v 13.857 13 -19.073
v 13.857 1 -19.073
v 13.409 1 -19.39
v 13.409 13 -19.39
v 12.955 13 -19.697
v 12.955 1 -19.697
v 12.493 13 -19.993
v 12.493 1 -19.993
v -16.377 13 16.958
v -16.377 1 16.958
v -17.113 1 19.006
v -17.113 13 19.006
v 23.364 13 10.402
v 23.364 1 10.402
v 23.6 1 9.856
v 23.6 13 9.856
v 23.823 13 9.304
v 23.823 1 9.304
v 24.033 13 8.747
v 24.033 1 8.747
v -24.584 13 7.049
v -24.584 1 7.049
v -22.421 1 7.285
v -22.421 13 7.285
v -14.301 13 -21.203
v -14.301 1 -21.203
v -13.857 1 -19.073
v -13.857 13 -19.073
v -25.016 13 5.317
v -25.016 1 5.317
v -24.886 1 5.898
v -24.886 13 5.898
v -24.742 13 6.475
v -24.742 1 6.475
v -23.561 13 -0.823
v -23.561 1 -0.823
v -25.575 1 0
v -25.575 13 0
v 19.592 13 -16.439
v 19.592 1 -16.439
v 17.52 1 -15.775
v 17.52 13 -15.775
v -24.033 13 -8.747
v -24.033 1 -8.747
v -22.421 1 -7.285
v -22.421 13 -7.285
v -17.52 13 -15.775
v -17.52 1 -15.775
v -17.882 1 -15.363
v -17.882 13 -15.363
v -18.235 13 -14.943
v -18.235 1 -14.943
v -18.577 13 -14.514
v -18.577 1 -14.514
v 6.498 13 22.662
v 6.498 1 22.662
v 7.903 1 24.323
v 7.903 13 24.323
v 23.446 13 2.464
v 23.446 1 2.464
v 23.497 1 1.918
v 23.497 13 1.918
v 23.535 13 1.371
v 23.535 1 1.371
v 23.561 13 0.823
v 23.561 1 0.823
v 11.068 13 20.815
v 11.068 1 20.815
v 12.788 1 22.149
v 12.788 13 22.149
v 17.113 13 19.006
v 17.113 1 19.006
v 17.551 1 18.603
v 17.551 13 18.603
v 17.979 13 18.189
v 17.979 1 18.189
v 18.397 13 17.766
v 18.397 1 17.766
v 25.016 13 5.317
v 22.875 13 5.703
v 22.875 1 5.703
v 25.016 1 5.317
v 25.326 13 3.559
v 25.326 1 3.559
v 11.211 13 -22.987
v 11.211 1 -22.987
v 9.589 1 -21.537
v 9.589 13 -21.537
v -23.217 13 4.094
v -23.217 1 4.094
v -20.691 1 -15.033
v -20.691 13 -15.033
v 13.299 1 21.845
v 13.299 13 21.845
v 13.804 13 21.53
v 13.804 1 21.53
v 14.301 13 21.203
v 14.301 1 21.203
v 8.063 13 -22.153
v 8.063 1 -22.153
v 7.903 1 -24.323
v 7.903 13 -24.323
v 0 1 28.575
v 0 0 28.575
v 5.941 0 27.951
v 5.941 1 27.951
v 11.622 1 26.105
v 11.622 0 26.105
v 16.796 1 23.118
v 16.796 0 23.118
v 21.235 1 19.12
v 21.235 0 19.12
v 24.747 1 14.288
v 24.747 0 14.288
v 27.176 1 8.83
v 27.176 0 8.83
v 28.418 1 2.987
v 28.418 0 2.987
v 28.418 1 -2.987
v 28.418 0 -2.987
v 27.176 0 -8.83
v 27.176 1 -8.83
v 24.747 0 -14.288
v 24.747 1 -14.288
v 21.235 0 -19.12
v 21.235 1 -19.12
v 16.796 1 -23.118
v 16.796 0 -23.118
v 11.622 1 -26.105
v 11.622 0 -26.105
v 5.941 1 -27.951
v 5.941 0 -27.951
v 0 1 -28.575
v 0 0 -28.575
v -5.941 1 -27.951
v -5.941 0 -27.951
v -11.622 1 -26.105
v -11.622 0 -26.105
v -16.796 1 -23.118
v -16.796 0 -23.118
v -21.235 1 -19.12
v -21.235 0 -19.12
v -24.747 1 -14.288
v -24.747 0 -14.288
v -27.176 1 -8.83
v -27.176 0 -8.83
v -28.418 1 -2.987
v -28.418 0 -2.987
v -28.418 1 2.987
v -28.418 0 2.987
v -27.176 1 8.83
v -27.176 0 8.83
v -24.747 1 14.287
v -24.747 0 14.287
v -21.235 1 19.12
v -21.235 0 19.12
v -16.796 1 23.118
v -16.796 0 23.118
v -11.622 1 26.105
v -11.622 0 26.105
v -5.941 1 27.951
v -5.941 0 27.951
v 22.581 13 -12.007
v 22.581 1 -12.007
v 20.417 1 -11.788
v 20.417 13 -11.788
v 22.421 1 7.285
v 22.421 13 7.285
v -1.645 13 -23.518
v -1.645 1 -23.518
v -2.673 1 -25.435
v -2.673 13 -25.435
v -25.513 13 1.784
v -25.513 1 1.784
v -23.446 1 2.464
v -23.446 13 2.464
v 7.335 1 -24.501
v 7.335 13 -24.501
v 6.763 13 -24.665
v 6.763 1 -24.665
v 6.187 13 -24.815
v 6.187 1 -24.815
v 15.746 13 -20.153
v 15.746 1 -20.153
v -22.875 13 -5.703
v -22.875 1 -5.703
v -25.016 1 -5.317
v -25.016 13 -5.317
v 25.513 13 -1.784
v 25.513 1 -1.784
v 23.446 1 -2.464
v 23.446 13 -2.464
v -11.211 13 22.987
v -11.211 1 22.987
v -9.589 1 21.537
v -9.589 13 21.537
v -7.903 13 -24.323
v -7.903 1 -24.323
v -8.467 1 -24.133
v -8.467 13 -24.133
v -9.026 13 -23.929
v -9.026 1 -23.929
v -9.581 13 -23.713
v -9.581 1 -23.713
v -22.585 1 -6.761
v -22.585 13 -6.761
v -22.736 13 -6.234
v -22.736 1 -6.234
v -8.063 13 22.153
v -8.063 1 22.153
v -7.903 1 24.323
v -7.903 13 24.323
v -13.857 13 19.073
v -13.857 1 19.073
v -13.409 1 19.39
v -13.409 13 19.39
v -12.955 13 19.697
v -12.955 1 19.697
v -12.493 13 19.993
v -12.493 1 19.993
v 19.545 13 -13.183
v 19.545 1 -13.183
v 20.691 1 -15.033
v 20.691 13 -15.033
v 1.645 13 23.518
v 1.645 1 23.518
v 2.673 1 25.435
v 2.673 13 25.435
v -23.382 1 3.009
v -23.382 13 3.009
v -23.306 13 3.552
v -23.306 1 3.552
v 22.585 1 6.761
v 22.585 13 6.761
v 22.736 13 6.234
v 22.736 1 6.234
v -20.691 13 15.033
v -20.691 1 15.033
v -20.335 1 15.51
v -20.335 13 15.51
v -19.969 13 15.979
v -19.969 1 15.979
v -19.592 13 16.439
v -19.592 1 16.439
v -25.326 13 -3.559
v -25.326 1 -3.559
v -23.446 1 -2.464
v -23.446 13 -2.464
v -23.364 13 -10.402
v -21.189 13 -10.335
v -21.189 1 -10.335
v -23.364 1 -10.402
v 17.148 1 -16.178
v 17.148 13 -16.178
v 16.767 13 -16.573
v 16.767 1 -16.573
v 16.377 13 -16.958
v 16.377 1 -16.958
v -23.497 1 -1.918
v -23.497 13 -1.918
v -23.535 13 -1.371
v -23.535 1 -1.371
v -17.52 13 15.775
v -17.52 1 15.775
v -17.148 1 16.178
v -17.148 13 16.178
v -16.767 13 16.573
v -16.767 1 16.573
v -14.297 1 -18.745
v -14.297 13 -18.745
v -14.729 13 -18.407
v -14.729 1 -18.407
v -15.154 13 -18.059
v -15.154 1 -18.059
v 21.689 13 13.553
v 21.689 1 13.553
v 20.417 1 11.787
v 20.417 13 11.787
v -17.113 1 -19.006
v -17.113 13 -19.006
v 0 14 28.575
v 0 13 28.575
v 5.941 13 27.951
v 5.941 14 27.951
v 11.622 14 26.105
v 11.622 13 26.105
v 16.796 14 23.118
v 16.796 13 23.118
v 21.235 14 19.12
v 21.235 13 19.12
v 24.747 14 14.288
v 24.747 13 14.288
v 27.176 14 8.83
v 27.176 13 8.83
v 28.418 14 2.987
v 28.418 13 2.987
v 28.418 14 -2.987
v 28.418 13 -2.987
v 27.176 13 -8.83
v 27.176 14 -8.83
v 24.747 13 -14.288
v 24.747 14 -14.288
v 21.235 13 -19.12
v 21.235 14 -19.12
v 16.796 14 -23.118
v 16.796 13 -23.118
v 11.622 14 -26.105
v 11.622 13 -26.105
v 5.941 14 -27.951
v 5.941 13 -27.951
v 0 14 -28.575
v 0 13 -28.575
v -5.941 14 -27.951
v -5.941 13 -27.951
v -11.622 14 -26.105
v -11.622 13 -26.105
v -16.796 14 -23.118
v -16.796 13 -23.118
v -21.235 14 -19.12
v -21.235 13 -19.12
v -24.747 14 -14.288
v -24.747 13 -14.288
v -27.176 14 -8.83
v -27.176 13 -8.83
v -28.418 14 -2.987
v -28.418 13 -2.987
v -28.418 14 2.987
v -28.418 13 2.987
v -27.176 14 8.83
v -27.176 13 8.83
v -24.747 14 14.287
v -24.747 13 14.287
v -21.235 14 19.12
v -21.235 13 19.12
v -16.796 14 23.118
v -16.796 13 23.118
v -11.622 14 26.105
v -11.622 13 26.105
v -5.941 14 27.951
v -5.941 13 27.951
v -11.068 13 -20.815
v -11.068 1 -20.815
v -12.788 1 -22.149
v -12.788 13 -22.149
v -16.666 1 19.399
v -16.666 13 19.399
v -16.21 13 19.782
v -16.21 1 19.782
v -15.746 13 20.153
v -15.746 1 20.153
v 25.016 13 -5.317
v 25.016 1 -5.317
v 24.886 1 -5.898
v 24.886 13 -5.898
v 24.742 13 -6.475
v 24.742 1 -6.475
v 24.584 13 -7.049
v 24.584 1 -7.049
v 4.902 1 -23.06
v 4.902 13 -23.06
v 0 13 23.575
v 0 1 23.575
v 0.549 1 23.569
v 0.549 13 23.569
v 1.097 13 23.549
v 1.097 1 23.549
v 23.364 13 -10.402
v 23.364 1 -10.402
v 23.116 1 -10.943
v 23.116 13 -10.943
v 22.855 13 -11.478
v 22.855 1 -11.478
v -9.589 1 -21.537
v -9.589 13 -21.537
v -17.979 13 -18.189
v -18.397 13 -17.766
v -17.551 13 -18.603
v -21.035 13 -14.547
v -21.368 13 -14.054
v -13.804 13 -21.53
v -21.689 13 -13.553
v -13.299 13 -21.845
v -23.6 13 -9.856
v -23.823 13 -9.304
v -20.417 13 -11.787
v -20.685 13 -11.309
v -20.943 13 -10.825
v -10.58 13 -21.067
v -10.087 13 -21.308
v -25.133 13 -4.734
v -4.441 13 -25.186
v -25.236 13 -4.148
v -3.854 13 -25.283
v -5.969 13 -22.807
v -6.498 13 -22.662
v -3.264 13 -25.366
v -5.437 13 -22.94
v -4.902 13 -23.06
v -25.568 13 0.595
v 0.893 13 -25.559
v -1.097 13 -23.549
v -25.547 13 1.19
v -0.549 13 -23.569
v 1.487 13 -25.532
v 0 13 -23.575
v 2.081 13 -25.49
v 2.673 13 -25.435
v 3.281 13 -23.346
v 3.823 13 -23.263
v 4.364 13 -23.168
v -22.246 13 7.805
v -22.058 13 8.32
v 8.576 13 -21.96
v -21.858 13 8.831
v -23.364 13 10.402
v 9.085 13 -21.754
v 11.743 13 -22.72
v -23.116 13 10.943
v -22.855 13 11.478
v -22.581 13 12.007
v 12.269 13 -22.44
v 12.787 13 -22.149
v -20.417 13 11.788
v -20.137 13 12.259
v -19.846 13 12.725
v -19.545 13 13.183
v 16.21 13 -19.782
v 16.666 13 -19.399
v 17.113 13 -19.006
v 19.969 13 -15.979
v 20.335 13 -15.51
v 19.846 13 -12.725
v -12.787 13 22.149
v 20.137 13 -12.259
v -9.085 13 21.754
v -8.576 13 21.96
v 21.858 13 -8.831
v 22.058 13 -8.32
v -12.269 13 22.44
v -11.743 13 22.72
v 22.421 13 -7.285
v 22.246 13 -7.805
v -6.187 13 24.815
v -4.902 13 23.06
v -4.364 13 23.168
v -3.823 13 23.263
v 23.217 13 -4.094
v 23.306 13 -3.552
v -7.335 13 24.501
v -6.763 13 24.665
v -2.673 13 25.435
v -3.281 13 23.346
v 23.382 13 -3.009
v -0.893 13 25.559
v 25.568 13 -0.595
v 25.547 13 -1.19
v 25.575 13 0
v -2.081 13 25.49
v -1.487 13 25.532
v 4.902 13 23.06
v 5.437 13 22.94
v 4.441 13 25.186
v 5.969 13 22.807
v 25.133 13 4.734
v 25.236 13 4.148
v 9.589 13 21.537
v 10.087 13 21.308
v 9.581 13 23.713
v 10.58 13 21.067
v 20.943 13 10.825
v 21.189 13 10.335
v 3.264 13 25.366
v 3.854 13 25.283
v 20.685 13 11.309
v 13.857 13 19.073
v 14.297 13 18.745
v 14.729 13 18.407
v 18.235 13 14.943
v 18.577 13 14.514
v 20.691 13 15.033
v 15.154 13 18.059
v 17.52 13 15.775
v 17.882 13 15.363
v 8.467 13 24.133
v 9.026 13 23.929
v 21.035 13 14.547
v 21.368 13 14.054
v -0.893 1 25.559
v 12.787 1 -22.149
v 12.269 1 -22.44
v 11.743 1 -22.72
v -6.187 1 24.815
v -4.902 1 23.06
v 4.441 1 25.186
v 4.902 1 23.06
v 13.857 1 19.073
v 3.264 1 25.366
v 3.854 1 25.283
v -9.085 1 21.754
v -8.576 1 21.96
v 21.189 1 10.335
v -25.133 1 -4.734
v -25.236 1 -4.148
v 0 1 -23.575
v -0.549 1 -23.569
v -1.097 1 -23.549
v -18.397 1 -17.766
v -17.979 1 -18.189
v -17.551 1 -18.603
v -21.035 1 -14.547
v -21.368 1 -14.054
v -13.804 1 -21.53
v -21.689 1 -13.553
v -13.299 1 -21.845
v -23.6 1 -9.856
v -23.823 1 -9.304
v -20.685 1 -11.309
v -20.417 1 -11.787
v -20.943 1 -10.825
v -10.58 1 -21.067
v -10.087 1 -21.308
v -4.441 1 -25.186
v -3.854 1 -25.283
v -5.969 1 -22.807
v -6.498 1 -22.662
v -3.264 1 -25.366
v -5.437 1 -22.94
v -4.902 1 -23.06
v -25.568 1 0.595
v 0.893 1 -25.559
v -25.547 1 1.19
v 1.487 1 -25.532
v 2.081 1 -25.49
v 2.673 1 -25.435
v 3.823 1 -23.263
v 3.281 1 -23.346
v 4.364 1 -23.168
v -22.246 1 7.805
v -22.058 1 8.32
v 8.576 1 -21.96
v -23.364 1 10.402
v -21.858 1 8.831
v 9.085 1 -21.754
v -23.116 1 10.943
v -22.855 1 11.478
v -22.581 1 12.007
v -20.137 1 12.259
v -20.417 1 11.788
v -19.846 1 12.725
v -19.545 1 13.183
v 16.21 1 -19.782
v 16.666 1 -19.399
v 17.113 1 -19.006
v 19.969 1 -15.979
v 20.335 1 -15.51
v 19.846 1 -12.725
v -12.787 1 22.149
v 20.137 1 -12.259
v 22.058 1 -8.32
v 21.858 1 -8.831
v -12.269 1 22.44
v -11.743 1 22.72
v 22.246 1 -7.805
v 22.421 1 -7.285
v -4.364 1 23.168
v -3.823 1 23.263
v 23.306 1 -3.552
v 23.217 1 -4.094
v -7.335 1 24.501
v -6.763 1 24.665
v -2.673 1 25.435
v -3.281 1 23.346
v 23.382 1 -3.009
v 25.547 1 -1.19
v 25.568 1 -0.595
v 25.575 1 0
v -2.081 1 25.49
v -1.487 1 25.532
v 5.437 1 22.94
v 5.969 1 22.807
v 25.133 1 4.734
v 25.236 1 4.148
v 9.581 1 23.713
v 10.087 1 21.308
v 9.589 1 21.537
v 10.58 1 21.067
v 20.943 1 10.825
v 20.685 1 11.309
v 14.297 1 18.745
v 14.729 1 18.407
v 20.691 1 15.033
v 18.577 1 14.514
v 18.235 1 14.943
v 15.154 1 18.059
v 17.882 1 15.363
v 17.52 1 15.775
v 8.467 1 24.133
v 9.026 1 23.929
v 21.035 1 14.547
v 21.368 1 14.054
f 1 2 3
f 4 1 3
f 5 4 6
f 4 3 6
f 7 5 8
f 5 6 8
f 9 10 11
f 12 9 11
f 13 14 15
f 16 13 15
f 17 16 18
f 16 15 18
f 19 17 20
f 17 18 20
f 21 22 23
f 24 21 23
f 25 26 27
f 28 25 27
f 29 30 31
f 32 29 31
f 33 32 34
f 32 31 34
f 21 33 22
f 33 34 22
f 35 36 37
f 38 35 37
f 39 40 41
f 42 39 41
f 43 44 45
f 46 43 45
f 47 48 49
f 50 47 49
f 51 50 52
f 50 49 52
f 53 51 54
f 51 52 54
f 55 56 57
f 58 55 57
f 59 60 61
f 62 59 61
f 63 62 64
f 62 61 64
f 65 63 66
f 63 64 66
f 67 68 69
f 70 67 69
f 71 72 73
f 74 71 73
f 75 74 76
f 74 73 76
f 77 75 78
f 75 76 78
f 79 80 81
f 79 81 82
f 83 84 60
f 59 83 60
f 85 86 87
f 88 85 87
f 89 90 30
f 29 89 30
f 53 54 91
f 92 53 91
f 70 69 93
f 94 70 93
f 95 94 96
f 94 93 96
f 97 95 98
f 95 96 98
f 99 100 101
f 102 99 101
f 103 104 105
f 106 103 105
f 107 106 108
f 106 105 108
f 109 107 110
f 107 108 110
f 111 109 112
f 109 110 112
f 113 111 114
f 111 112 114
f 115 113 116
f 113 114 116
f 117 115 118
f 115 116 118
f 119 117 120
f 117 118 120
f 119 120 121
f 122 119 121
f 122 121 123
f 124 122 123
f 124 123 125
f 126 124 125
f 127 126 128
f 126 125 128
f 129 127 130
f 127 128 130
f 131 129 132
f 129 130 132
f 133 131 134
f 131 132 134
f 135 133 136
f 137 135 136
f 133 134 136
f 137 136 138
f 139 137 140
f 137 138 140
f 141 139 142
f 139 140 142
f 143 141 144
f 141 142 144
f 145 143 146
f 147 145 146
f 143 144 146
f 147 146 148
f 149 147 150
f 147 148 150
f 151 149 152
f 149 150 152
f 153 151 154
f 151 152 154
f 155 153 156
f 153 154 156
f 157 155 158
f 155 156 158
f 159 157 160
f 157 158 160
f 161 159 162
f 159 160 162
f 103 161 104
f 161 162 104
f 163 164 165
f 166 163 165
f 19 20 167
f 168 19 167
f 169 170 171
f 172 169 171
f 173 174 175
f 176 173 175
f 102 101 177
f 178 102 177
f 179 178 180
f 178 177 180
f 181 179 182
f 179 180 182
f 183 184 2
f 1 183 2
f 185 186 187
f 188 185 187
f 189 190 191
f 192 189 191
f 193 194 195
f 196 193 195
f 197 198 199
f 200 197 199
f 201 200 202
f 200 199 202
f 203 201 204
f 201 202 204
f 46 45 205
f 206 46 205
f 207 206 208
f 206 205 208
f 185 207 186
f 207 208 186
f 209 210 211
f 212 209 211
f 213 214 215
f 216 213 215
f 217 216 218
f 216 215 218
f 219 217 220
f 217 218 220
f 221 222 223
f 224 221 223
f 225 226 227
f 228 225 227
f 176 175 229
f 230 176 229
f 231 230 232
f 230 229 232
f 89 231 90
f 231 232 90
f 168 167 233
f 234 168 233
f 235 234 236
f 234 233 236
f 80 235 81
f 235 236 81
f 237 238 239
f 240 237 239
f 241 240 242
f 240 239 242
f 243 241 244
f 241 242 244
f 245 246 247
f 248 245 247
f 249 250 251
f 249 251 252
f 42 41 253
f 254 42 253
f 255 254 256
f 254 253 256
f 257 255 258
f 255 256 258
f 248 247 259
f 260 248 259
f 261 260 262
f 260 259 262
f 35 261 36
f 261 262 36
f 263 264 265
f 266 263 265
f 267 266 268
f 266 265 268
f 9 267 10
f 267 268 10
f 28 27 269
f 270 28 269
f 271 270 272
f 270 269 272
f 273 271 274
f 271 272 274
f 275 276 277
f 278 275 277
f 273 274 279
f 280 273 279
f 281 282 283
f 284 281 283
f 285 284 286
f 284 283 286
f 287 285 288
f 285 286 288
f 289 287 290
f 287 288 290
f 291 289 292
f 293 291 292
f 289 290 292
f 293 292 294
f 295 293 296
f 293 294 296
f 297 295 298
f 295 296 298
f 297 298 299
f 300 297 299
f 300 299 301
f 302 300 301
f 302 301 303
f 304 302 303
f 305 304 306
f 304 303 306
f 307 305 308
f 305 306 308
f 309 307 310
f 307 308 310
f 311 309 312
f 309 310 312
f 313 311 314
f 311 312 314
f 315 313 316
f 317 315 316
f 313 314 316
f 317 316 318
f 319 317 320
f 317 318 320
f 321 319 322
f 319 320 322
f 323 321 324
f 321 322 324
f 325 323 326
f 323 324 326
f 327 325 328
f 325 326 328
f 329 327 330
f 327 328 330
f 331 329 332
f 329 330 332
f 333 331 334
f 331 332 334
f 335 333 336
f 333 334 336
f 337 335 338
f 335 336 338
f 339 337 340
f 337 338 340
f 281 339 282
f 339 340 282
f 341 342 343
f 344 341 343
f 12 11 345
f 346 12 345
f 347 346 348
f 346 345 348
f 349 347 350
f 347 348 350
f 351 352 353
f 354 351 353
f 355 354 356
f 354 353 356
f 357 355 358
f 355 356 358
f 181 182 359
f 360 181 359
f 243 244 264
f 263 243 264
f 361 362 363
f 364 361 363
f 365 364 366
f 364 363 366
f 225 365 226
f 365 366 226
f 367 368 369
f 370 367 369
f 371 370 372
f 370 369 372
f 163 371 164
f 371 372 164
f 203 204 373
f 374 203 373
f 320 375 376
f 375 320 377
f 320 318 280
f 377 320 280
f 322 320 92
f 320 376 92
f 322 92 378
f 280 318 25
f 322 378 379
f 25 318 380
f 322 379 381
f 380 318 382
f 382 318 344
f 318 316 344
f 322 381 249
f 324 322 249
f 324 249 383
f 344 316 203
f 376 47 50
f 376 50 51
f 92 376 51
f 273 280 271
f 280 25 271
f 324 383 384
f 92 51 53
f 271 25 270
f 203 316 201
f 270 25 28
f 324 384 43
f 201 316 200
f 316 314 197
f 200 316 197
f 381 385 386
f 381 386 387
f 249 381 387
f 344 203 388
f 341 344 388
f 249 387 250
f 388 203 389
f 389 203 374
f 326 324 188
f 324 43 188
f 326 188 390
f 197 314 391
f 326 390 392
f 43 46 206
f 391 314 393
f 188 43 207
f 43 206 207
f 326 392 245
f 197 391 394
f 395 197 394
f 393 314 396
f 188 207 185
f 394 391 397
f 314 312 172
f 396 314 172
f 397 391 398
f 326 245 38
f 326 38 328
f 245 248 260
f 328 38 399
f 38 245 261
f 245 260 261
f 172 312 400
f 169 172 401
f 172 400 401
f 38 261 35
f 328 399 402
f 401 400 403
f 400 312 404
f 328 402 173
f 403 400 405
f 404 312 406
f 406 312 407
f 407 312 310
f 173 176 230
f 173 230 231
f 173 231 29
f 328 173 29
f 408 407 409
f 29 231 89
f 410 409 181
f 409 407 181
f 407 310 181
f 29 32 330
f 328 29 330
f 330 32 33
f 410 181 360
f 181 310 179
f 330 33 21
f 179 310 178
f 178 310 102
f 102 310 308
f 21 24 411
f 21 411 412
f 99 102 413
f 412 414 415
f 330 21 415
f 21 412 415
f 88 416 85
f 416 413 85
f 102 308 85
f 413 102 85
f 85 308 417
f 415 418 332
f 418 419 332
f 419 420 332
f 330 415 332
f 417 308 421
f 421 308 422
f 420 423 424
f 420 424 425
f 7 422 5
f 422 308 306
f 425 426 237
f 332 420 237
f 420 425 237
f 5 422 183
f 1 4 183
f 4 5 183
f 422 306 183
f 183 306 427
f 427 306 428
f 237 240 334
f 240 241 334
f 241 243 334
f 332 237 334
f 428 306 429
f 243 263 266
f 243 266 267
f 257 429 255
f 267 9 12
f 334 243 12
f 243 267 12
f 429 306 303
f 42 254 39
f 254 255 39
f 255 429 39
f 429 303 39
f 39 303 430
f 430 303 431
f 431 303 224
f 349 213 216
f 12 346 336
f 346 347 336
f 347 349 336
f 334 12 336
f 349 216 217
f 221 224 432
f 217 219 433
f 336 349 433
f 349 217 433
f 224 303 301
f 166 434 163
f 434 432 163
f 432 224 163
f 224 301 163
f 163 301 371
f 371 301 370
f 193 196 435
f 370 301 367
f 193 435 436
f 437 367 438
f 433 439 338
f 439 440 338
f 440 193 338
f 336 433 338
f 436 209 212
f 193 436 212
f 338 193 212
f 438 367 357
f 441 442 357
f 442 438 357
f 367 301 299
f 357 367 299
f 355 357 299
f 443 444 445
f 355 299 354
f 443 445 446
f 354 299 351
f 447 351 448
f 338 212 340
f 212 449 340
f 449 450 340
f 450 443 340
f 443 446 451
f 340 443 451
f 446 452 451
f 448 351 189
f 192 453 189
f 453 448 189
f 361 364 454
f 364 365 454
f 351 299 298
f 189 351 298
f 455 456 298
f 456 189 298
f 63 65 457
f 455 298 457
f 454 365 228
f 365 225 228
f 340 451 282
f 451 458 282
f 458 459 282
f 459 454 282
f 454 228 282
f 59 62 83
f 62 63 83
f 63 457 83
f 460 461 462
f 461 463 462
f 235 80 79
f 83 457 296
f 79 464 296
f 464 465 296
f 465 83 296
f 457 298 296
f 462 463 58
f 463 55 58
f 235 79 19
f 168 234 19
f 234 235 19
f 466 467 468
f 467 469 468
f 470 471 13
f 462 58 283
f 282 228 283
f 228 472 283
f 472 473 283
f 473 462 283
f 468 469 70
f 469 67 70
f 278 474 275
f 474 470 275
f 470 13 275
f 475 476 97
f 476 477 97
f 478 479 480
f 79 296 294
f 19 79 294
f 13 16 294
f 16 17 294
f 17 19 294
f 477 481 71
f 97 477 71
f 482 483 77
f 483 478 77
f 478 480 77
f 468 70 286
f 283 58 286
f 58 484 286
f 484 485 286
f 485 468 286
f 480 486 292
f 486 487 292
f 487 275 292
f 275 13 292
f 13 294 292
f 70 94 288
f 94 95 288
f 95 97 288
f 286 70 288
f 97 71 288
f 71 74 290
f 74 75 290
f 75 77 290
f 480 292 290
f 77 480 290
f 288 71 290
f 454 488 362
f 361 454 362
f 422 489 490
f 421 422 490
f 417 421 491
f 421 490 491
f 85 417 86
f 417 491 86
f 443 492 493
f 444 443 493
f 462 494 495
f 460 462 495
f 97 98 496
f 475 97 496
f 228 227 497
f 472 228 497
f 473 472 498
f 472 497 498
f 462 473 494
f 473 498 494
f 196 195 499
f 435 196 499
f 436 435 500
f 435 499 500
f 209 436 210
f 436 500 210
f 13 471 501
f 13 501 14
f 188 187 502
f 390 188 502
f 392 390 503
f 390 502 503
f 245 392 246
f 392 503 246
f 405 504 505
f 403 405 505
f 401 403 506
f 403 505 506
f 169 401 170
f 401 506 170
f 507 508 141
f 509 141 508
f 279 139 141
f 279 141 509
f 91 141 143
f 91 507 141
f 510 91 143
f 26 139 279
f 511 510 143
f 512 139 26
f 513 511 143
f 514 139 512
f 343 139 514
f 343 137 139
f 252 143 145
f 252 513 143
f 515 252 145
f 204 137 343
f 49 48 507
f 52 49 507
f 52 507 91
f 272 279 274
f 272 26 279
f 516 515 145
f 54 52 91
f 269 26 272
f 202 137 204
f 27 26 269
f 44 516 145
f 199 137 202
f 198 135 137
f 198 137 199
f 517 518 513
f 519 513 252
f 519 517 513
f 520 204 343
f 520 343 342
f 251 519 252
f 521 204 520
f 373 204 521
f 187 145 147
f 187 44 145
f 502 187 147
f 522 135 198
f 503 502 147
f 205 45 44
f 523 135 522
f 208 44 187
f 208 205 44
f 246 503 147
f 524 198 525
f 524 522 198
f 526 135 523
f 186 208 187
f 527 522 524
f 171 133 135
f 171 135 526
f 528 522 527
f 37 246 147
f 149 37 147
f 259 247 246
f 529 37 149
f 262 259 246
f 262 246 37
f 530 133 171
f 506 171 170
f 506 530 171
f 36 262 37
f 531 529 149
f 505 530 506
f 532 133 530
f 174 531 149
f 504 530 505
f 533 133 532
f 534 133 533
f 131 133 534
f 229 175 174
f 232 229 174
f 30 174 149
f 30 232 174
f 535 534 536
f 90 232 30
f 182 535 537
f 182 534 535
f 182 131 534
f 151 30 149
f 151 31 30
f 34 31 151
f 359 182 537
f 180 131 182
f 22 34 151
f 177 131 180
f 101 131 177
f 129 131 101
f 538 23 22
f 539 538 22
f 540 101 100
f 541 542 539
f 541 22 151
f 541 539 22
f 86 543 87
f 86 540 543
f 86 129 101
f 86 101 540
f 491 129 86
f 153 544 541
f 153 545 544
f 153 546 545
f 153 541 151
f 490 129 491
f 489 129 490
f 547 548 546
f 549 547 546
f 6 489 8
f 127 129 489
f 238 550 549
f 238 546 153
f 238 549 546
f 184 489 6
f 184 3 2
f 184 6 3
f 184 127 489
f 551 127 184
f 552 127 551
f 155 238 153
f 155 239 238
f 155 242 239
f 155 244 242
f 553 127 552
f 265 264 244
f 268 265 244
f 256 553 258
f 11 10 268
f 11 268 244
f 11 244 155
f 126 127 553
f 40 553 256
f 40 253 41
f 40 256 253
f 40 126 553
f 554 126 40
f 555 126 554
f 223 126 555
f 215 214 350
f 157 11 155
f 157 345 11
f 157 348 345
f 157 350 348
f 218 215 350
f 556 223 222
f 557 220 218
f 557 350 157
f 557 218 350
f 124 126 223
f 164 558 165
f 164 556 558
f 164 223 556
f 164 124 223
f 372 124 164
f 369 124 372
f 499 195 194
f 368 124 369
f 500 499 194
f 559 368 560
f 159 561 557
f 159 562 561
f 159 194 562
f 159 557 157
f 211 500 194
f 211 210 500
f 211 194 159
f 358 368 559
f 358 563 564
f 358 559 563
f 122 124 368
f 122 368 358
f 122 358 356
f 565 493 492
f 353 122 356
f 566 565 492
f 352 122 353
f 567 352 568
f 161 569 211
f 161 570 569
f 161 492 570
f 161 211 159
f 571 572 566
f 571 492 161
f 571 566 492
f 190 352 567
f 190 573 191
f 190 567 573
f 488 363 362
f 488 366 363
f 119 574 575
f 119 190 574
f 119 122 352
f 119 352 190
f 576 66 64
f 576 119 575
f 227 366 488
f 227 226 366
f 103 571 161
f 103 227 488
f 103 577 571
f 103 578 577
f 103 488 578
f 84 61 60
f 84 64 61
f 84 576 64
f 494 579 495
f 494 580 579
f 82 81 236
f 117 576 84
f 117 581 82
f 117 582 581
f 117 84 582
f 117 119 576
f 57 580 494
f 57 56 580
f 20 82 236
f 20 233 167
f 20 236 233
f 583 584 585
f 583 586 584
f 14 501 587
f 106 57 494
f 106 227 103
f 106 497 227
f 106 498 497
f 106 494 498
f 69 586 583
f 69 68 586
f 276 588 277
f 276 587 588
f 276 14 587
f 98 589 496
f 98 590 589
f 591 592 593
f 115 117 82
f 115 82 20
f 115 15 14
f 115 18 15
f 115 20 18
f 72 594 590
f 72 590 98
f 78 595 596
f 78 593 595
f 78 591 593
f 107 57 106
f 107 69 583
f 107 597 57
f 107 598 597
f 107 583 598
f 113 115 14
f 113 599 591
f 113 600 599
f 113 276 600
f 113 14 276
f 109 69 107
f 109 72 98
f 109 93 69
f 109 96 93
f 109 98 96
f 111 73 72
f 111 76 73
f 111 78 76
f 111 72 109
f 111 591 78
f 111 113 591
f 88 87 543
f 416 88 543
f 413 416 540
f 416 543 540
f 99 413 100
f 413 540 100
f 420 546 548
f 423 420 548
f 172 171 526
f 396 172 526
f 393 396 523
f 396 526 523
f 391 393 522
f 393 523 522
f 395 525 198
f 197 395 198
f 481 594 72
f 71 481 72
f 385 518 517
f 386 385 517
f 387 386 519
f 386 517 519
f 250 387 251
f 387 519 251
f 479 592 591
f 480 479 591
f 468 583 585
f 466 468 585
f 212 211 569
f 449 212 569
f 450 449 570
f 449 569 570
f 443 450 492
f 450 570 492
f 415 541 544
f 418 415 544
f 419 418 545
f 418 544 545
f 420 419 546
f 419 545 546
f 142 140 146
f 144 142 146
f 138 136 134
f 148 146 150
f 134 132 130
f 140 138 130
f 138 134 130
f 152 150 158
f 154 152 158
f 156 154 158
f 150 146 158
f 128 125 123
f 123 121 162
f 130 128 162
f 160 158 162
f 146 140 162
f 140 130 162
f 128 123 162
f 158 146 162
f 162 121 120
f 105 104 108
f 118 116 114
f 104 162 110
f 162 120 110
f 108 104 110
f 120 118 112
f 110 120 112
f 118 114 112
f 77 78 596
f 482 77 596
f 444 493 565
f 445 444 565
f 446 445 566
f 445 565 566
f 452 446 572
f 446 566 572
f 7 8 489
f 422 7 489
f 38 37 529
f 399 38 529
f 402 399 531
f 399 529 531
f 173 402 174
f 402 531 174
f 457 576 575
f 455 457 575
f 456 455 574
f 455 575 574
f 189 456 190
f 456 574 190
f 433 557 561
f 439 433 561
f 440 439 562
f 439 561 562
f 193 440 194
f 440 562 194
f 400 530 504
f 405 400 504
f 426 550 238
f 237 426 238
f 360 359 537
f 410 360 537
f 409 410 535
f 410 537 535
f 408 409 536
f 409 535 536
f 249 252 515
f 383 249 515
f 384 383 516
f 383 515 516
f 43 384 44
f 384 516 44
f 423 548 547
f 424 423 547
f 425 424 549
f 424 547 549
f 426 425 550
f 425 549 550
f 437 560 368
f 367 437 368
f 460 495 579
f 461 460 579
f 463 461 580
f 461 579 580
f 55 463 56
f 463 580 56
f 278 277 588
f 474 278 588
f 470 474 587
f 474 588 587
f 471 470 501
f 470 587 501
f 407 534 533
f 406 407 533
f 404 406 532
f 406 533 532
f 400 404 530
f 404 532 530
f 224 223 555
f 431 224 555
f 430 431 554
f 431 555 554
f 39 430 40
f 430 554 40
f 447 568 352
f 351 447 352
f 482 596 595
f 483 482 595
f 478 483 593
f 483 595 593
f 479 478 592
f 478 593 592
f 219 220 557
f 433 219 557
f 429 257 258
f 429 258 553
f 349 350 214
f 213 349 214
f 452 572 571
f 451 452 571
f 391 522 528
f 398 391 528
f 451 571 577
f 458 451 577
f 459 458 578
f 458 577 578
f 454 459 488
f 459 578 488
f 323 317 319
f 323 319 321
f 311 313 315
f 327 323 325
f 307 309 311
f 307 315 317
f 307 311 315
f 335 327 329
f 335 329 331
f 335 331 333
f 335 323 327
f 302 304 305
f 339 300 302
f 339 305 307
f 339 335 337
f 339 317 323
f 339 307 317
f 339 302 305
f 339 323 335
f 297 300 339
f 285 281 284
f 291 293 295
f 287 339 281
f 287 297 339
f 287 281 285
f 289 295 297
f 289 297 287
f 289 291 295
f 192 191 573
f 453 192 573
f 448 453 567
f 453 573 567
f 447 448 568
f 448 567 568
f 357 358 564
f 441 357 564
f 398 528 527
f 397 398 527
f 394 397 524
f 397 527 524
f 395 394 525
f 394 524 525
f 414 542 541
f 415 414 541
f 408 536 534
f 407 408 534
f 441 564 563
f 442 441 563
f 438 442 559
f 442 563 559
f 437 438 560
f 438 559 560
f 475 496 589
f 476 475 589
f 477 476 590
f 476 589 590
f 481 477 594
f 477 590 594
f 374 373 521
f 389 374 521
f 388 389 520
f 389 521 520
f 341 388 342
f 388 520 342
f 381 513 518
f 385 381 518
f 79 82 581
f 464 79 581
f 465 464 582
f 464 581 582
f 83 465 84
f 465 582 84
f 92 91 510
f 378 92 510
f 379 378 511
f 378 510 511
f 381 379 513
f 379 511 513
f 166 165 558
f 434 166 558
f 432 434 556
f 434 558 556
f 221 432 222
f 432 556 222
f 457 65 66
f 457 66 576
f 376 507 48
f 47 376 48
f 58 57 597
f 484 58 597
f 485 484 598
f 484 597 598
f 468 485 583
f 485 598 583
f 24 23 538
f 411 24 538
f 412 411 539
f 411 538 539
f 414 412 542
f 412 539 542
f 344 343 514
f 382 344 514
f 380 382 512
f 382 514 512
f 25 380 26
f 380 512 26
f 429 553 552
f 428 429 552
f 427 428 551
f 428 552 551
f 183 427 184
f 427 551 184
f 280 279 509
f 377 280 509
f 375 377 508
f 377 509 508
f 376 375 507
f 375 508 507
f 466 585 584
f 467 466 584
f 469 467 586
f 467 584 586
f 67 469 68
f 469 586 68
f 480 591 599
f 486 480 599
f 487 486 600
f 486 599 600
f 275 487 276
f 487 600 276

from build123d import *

# Parameters (mm, degrees)
SKETCH1_R           = 28.575
BOSS_EXTRUDE1_DEPTH = 1
BOSS_EXTRUDE3_DEPTH = 12
CIRPATTERN2_COUNT   = 30
SKETCH3_R           = 28.575
BOSS_EXTRUDE4_DEPTH = 1


with BuildPart() as part:
    # Sketch1 → Boss-Extrude1 (new body)
    with BuildSketch(Plane(origin=(0, 0, 0), x_dir=(1, 0, 0), z_dir=(0, 1, 0))):
        with Locations(Location((0, 0, 0), (0, 0, 270))):
            Circle(SKETCH1_R)
    extrude(amount=BOSS_EXTRUDE1_DEPTH)

    # Sketch2 → Boss-Extrude3 (add)
    with BuildSketch(Plane(origin=(0, 1, 0), x_dir=(1, 0, 0), z_dir=(0, 1, 0))):
        with BuildLine():
            Line((0, 0), (25.575, 0))
            ThreePointArc((25.575, 0), (25.559420401, 0.892554628), (25.512700585, 1.784021816))
            Line((25.512700585, 1.784021816), (23.445853683, 2.464258522))
            ThreePointArc((23.445853683, 2.464258522), (23.345569721, 3.281005855), (23.216842777, 4.093755788))
            Line((23.216842777, 4.093755788), (25.016124889, 5.317341493))
            Line((25.016124889, 5.317341493), (0, 0))
        make_face()
    boss_extrude3 = extrude(amount=BOSS_EXTRUDE3_DEPTH)

    # CirPattern2: Boss-Extrude3 ×30 about axis
    cirpattern2_axis = Axis((0, 0, 0), (0, 1, 0))
    for i in range(1, CIRPATTERN2_COUNT):
        add(boss_extrude3.rotate(cirpattern2_axis, i * 360 / CIRPATTERN2_COUNT))

    # Sketch3 → Boss-Extrude4 (add)
    with BuildSketch(Plane(origin=(0, 13, 0), x_dir=(1, 0, 0), z_dir=(0, 1, 0))):
        with Locations(Location((0, 0, 0), (0, 0, 270))):
            Circle(SKETCH3_R)
    extrude(amount=BOSS_EXTRUDE4_DEPTH)


solid = part.part
